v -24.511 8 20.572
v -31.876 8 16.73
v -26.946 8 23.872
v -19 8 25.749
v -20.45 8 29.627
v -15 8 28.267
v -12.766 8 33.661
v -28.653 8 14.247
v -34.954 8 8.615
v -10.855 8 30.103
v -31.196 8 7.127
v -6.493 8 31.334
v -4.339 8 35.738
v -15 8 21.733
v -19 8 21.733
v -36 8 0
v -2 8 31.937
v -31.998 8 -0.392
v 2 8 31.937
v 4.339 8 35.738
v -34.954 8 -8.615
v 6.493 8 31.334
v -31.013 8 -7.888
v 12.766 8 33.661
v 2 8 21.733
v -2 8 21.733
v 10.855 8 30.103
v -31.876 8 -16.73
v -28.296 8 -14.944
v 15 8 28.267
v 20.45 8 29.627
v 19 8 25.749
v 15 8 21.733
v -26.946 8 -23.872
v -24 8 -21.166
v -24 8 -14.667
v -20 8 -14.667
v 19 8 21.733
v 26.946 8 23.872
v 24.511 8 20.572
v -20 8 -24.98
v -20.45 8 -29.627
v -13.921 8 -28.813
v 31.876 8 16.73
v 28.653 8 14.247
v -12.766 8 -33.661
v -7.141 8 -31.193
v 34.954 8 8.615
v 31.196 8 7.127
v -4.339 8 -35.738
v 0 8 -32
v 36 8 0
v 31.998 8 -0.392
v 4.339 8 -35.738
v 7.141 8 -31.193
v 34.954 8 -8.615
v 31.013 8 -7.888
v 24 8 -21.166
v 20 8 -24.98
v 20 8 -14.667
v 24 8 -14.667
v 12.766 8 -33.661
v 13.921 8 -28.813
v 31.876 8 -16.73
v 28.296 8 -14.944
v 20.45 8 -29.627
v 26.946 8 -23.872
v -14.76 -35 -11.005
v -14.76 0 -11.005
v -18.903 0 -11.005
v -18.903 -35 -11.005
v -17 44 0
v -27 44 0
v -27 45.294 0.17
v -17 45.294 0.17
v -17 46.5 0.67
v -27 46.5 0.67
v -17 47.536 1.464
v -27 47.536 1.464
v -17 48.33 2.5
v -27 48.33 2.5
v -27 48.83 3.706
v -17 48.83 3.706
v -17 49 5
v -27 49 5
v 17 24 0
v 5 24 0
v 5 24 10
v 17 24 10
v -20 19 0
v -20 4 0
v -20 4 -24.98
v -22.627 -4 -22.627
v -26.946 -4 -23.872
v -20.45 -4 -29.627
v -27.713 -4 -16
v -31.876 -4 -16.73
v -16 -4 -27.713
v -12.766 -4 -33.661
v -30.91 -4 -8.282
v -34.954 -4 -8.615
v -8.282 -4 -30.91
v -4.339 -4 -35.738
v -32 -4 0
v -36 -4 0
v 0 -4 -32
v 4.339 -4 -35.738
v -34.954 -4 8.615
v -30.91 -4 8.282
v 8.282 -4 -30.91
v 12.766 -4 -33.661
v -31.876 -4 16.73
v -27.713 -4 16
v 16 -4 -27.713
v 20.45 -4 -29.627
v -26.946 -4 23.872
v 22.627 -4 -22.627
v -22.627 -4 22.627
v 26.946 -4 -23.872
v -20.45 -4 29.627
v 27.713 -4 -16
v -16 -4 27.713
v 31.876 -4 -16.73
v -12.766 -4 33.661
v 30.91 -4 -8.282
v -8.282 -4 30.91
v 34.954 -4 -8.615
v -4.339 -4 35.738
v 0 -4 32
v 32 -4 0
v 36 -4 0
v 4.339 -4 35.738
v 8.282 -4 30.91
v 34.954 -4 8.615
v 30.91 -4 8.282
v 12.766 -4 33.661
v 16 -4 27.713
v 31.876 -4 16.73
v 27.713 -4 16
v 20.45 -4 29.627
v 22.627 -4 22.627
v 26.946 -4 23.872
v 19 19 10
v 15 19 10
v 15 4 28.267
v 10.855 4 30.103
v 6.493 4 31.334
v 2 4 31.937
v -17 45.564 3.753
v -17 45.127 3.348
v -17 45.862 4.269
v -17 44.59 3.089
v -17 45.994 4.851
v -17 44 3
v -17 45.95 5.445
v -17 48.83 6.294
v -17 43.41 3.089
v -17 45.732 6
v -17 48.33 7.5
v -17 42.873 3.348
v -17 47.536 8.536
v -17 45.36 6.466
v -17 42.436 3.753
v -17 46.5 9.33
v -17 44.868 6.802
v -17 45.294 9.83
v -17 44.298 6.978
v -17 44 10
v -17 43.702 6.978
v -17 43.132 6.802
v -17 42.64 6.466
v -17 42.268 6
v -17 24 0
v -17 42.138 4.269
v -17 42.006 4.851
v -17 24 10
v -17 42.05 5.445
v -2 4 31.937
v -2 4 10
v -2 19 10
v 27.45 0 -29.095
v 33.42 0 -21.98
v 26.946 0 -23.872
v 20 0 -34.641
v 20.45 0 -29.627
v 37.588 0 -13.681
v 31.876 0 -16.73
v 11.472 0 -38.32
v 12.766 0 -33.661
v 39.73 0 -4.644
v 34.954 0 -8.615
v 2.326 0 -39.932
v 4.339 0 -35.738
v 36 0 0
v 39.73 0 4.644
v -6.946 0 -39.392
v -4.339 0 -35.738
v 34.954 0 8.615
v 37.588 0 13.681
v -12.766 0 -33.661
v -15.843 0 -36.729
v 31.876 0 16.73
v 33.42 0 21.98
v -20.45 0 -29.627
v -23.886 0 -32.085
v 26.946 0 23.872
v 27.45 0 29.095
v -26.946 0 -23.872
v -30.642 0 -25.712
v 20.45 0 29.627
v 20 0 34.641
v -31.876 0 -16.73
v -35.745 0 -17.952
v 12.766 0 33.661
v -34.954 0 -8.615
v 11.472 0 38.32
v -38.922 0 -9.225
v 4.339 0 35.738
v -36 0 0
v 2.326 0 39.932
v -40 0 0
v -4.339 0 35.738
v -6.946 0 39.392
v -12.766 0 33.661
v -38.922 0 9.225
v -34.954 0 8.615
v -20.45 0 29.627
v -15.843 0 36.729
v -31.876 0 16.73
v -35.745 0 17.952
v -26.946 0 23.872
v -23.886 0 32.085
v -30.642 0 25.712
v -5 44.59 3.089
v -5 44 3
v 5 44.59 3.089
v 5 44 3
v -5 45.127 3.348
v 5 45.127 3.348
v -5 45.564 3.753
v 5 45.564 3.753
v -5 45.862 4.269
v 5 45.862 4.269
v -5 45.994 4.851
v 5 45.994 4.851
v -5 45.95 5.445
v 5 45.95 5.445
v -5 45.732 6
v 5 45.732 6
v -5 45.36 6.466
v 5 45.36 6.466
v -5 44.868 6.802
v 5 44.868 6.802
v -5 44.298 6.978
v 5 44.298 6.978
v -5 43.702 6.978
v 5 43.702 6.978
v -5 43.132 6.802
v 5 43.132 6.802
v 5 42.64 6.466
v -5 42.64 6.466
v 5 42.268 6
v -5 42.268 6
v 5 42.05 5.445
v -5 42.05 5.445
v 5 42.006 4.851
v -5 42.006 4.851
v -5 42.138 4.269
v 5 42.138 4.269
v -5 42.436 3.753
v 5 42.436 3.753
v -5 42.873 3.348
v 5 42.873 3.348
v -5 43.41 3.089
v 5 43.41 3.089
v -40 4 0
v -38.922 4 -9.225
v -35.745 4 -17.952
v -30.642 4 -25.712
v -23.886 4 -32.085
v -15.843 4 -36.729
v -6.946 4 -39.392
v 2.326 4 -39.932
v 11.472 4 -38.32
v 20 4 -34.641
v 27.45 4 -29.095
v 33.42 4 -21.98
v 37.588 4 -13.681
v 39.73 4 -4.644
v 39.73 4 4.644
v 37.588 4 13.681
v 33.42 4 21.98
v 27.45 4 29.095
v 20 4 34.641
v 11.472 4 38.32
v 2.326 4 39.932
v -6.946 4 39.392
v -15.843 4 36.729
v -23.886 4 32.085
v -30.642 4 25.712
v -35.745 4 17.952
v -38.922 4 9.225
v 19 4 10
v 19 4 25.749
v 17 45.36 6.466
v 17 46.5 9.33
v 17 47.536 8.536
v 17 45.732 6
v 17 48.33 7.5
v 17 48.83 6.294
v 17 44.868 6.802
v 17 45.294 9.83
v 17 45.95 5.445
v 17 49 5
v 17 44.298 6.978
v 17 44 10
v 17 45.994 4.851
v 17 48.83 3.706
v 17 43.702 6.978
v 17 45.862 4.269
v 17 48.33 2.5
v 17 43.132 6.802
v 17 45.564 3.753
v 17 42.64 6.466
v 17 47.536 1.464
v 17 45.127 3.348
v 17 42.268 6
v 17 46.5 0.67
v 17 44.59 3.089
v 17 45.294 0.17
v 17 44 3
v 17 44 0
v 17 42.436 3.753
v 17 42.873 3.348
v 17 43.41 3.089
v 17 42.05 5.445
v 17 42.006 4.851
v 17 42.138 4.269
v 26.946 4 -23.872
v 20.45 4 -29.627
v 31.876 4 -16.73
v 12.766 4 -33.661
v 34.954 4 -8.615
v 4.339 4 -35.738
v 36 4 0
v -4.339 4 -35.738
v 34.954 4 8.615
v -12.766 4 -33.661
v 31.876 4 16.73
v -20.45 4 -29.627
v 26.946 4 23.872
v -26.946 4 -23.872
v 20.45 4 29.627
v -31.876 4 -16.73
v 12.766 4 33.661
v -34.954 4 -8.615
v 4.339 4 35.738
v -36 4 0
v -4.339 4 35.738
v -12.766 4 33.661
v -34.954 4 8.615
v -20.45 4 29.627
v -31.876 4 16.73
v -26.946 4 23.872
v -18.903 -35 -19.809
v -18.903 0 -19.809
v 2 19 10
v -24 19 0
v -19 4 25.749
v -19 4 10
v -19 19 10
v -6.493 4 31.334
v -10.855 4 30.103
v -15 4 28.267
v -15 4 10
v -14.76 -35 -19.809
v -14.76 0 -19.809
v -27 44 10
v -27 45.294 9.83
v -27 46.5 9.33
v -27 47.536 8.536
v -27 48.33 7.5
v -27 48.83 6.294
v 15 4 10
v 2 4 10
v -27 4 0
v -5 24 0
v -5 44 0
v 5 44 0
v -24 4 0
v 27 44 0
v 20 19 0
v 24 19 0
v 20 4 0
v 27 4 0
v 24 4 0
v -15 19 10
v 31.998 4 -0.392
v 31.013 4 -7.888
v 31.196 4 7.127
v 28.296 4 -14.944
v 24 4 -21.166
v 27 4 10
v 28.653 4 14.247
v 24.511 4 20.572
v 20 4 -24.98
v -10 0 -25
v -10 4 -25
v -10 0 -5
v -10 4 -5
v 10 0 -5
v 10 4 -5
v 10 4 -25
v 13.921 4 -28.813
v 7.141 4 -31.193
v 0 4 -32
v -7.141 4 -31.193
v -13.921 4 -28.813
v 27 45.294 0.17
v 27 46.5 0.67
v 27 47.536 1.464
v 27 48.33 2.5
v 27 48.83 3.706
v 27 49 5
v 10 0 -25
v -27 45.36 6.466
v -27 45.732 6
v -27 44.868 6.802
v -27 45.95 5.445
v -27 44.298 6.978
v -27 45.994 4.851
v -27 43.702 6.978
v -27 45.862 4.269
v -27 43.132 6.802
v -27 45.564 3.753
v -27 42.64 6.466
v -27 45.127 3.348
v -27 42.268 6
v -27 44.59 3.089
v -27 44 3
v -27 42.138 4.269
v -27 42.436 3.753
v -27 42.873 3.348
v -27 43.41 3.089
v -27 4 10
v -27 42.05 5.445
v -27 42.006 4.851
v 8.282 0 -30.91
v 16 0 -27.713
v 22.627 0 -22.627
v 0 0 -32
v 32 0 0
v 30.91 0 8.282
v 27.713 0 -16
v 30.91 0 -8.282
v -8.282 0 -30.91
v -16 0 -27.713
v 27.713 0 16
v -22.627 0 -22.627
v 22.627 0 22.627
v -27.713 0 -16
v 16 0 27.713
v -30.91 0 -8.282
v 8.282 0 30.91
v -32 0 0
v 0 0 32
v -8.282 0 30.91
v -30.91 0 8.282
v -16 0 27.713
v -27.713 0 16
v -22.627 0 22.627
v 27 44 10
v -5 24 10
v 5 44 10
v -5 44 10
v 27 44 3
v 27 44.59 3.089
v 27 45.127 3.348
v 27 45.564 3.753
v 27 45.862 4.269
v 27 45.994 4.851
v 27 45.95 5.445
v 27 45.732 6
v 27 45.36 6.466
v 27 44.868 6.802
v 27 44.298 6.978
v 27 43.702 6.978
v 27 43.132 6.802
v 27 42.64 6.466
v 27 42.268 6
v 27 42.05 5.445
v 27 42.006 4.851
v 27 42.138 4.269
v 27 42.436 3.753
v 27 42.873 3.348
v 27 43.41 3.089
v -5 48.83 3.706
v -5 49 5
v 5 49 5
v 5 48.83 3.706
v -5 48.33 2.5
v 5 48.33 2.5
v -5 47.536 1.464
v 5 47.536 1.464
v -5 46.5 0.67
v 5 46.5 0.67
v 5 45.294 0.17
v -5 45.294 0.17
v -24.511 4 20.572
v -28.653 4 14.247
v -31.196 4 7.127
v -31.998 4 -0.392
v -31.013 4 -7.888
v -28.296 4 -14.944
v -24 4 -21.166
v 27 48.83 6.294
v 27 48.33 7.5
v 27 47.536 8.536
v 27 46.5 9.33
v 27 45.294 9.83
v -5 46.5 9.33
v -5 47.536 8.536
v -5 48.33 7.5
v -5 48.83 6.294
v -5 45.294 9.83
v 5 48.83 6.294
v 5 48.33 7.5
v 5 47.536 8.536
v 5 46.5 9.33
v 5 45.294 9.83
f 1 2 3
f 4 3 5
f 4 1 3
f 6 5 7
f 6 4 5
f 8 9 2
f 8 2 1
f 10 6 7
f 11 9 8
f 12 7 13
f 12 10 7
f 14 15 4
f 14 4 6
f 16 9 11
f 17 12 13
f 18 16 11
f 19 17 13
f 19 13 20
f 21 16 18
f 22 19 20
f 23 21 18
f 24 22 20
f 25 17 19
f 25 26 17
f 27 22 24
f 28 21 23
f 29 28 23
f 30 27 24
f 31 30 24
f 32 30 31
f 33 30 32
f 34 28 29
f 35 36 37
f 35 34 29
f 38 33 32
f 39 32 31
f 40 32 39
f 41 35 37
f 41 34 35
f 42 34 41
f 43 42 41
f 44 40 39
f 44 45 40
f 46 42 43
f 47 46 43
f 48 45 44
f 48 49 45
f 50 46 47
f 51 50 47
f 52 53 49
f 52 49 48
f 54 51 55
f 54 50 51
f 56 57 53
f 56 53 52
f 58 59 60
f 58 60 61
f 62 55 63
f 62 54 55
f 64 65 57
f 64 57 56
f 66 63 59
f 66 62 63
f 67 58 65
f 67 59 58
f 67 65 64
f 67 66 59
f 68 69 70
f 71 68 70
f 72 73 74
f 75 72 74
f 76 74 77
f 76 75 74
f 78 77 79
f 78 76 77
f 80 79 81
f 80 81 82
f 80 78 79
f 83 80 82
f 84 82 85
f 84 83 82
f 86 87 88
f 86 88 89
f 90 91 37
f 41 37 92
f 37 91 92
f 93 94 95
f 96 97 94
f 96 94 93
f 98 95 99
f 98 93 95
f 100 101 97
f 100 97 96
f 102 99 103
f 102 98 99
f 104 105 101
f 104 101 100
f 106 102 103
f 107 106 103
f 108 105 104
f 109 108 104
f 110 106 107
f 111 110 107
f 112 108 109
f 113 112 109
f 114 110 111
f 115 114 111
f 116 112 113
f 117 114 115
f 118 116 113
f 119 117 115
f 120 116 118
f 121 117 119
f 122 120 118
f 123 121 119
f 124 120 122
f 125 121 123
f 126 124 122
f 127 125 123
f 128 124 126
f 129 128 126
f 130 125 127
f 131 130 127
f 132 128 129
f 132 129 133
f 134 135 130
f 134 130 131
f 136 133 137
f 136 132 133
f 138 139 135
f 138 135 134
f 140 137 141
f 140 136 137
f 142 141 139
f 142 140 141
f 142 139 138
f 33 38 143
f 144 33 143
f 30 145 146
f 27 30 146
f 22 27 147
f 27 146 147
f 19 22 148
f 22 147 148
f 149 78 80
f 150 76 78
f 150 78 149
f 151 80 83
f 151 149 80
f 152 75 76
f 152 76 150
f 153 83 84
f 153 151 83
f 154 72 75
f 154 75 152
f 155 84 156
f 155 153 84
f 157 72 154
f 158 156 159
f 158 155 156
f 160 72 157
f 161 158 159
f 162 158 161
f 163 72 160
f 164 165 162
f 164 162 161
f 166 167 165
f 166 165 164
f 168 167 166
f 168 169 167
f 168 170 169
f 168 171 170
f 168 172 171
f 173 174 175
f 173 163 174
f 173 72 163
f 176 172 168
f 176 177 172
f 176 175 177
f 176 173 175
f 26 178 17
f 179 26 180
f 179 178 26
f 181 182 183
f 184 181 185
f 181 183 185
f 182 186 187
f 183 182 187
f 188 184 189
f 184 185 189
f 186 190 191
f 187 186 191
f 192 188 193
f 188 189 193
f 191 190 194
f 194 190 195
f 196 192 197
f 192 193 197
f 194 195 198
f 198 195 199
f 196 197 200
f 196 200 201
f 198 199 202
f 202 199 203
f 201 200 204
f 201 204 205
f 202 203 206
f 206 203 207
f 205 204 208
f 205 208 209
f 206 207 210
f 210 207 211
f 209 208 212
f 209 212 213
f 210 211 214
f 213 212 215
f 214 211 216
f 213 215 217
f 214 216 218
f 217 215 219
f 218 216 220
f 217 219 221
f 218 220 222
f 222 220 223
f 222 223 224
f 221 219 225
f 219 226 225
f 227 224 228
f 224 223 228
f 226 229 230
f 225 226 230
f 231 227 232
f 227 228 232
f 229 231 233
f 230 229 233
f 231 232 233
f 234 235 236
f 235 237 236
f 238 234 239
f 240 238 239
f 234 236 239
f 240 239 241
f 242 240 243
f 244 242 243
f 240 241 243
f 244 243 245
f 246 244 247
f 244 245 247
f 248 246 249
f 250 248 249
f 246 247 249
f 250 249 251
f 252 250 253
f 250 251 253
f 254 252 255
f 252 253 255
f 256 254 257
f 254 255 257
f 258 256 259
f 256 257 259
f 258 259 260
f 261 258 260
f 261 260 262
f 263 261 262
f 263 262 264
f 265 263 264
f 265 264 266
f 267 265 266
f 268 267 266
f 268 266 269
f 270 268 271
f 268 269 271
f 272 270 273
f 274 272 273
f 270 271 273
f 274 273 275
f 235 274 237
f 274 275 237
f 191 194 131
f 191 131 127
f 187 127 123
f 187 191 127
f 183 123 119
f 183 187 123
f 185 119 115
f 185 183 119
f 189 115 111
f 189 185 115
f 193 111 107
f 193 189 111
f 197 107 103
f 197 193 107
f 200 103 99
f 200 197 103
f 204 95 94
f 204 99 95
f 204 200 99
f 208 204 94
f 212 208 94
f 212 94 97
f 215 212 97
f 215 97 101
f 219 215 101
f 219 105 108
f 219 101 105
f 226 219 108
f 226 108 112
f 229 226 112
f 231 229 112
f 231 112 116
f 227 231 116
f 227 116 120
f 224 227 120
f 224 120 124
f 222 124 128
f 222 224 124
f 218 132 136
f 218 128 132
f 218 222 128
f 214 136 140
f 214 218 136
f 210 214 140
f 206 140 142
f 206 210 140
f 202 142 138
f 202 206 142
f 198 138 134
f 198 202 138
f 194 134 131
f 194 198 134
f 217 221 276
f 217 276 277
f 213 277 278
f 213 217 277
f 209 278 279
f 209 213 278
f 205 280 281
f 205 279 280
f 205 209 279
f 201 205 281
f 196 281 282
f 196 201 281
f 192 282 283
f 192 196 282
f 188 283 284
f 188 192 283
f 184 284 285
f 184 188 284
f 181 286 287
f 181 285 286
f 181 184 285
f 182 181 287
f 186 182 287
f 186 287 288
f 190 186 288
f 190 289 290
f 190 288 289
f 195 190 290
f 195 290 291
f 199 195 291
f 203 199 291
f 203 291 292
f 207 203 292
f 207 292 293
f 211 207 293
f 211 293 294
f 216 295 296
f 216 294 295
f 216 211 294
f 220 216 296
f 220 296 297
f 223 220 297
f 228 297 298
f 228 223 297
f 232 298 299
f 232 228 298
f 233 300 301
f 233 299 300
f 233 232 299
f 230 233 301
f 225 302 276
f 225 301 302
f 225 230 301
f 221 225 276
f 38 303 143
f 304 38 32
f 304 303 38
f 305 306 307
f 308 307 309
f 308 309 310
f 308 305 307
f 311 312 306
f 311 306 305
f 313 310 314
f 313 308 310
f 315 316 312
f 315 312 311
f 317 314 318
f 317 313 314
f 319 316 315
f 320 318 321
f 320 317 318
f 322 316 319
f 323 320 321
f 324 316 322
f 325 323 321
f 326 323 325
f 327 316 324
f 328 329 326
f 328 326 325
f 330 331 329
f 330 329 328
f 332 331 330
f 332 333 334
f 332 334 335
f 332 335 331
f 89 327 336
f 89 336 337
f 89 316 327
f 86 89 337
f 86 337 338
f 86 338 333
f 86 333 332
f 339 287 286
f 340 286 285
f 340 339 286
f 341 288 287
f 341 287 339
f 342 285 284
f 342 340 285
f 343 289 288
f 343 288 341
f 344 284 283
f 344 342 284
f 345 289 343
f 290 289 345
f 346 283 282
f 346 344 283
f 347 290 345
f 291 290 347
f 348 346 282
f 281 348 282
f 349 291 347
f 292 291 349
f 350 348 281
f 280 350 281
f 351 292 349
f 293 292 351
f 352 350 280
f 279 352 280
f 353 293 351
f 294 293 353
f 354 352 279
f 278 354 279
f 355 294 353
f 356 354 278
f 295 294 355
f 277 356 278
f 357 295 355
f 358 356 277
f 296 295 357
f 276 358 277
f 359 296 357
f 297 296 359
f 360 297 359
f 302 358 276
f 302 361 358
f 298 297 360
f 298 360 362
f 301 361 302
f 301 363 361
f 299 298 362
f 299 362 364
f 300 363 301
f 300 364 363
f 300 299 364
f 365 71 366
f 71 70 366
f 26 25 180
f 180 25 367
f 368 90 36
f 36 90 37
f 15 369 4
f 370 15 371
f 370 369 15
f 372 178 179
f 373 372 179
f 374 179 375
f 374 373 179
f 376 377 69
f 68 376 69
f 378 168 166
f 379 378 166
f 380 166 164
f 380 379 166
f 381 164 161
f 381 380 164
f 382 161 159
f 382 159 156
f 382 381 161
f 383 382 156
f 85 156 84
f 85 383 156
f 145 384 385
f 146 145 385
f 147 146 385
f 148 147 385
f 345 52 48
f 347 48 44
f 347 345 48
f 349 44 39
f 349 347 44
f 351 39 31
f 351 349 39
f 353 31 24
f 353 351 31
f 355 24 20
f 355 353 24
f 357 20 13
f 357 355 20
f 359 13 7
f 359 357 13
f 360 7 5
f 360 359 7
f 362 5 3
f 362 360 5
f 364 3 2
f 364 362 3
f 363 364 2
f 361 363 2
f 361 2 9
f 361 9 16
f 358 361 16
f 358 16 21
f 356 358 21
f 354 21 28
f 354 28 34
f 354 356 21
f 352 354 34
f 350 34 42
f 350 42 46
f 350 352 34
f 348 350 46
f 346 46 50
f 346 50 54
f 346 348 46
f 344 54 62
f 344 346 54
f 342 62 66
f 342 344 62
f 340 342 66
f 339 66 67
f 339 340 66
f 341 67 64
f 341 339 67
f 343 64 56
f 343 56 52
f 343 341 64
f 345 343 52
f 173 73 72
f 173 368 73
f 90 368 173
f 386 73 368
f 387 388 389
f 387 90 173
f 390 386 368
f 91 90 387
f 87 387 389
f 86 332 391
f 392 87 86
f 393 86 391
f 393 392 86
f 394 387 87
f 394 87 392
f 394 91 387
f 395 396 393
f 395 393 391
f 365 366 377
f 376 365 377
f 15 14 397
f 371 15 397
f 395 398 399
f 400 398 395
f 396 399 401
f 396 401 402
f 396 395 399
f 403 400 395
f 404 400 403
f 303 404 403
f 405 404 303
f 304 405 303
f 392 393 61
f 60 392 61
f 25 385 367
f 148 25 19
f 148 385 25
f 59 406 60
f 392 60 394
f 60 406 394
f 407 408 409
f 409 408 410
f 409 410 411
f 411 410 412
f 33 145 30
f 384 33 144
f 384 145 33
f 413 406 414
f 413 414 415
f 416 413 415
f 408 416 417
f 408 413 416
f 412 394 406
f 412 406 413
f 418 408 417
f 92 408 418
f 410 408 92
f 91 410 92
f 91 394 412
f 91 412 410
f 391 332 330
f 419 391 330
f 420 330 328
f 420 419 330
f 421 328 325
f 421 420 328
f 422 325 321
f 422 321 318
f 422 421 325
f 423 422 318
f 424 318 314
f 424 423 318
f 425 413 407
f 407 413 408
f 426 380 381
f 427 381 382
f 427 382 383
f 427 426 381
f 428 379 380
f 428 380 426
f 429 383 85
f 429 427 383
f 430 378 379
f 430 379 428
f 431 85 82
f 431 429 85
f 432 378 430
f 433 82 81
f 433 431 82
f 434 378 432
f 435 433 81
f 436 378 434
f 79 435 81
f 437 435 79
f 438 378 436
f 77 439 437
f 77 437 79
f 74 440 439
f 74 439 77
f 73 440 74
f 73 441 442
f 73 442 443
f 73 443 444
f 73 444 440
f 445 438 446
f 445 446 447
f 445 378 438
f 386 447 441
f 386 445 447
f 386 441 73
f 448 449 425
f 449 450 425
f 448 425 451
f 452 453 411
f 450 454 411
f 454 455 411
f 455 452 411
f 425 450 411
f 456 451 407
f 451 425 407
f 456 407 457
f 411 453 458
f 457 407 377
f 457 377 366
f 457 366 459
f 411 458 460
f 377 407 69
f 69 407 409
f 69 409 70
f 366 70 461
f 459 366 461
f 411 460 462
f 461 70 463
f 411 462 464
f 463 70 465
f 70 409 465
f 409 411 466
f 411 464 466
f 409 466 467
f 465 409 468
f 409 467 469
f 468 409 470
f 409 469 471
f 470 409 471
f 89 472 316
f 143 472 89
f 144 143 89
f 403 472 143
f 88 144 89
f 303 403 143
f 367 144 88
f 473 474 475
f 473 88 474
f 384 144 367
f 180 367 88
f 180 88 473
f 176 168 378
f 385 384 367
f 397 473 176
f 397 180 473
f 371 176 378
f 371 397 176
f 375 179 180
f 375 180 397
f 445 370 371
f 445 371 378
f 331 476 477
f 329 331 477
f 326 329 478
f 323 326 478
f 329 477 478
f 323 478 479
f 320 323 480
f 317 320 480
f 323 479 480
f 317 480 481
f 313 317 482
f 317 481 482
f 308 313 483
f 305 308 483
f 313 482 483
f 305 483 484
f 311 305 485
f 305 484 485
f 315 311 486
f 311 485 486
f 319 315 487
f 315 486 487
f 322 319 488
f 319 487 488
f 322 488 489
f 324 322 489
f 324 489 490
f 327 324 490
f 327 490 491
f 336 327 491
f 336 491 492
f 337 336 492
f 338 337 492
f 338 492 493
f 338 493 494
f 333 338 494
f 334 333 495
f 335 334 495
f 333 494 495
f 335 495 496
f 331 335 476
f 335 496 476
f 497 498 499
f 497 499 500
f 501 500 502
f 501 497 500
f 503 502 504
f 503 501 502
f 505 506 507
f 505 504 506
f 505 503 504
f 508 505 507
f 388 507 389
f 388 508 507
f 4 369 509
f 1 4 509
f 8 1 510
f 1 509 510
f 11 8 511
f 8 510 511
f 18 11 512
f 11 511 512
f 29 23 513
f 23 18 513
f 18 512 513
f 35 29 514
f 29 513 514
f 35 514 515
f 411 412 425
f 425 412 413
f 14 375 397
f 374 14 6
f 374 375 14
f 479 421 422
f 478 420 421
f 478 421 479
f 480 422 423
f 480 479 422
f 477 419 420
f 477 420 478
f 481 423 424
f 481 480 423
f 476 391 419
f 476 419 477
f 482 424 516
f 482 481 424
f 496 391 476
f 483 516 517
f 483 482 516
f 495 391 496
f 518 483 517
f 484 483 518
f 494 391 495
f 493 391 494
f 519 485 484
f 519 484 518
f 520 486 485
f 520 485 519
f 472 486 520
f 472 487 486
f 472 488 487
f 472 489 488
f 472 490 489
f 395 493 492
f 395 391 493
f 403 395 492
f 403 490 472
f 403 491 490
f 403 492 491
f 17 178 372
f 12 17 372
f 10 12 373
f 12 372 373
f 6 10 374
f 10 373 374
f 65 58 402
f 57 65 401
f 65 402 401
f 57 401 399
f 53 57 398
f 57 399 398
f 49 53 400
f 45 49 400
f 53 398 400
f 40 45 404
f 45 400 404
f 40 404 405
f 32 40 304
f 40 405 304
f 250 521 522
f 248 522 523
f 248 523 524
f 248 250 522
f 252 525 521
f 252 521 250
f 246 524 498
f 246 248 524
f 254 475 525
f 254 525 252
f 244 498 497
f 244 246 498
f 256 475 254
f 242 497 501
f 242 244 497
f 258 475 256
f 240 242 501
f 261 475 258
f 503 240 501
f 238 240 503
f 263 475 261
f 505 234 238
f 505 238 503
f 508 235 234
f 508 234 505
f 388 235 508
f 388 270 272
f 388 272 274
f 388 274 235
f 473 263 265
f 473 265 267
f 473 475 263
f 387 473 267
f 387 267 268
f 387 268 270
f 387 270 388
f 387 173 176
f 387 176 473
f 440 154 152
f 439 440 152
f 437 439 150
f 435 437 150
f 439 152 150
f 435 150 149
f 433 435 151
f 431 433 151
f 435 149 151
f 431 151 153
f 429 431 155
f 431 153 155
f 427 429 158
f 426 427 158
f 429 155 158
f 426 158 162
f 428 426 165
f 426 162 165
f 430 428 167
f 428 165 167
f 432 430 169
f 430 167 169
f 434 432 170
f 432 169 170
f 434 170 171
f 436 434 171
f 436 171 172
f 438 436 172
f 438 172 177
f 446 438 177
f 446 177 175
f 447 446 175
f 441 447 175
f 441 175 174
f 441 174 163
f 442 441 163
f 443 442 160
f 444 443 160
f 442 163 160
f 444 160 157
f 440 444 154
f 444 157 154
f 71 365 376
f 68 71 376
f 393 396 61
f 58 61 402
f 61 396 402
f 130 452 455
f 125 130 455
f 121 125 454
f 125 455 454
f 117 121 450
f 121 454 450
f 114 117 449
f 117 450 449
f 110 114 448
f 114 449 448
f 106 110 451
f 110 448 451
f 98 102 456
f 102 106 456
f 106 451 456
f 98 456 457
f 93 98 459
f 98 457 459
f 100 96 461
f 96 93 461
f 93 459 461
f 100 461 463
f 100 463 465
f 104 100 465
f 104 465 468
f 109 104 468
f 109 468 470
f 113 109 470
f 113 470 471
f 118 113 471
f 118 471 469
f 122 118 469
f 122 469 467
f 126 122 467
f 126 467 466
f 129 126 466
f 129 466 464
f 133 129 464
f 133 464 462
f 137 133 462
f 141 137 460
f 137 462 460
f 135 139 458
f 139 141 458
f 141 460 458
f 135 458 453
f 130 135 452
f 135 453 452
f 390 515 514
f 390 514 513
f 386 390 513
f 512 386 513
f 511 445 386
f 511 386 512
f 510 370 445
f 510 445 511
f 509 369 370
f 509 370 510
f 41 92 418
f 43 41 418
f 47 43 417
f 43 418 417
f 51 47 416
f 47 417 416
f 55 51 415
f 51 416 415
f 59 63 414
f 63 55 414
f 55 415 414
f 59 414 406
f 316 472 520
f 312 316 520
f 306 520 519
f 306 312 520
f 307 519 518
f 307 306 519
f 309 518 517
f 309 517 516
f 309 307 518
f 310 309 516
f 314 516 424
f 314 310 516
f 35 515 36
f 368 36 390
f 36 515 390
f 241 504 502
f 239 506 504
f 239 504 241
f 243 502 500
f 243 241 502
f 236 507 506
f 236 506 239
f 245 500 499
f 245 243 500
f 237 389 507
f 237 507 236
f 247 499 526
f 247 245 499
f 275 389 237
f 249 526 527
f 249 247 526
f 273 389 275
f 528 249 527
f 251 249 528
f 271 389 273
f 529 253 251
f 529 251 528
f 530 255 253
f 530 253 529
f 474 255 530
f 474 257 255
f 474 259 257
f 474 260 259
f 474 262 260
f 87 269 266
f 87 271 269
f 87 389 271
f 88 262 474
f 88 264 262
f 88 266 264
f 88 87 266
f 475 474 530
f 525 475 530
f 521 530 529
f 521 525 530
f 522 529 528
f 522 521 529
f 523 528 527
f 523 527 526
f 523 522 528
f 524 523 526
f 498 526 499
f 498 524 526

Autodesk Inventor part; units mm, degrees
ref_plane "YZ Plane" through (0, 0, 0) normal (1, 0, 0) x (0, 1, 0)
ref_plane "XZ Plane" through (0, 0, 0) normal (0, 1, 0) x (-1, 0, 0)
ref_plane "XY Plane" through (0, 0, 0) normal (0, 0, 1) x (1, 0, 0)
sketch "Эскиз1" plane through (0, 0, 0) normal (0, 1, 0) x (-1, 0, 0)
  circle A0 centre (0, 0) radius 40
  dimension "d0" = 80
extrude "Выдавливание1" add sketch "Эскиз1" along normal blind 4
sketch "Эскиз2" plane through (0, 4, 0) normal (0, 1, 0) x (1, 0, 0)
  line L0 (-17, -10) -> (-27, -10)
  line L1 (-27, -10) -> (-27, 0)
  line L2 (-27, 0) -> (-17, 0)
  line L3 (-17, 0) -> (-17, -10)
  line L4 (27, -10) -> (17, -10)
  line L5 (17, -10) -> (17, 0)
  line L6 (17, 0) -> (27, 0)
  line L7 (27, 0) -> (27, -10)
  line L8 (5, -10) -> (-5, -10)
  line L9 (-5, -10) -> (-5, 0)
  line L10 (-5, 0) -> (5, 0)
  line L11 (5, 0) -> (5, -10)
  circle A0 centre (0, 0) radius 40 projected
  line L12 (0, 40) -> (0, 16.8758)
  line L13 (40, 0) -> (27.344, 0)
  line L14 (0, 0) -> (0, 40)
  line L15 (40, 0) -> (0, 0)
  line L16 (39.6863, -5) -> (-39.6863, -5)
  dimension "d3" = 10
  dimension "d4" = 12
  dimension "d5" = 10
  dimension "d14" = 5
extrude "Выдавливание2" add sketch "Эскиз2" along normal blind 45 contours L0 L1 L16 L3 | L16 L1 L2 L3 | L16 L11 L8 L9 | L9 L10 L11 L16 | L16 L7 L4 L5 | L5 L6 L7 L16
sketch "Эскиз3" plane through (27, 4, 10) normal (1, 0, 0) x (0, 0, -1)
  line L0 (0, 45) -> (10, 45) projected
  line L1 (10, 0) -> (10, 45) projected
  circle A0 centre (5, 40) radius 2
  point P0 (10, -4)
  point P1 (5, 45)
  point P2 (10, 40)
  dimension "d8" = 5
  dimension "d9" = 4
  dimension "d20" = 0
extrude "Выдавливание3" cut sketch "Эскиз3" against normal blind 100
fillet "Сопряжение1" radius 5 6 edges at (-22, 49, 10) (-22, 49, 0) (0, 49, 10) (0, 49, 0) (22, 49, 10) (22, 49, 0)
sketch "Эскиз4" plane through (0, 4, 0) normal (0, 1, 0) x (1, 0, 0)
  line L0 (10, 25) -> (-10, 25)
  line L1 (-10, 25) -> (-10, 5)
  line L2 (-10, 5) -> (10, 5)
  line L3 (10, 5) -> (10, 25)
  circle A0 centre (0, 0) radius 40 projected
  line L4 (0, 40) -> (0, 0)
  dimension "d15" = 20
  dimension "d16" = 20
  dimension "d17" = 5
extrude "Выдавливание4" cut sketch "Эскиз4" against normal blind 10 contours L3 L2 L4 L0 | L4 L2 L1 L0
sketch "Эскиз5" plane through (0, 4, 0) normal (0, 1, 0) x (1, 0, 0)
  line L0 (-27, -10) -> (-27, 0) projected
  line L1 (17, 0) -> (27, 0) projected
  line L2 (-27, -10) -> (27, -10)
  line L3 (27, -10) -> (27, 0)
  line L4 (27, 0) -> (-27, 0)
  line L5 (-27, 0) -> (-27, -10)
  point P0 (0, 0)
extrude "Выдавливание5" add sketch "Эскиз5" along normal blind 20
sketch "Эскиз6" plane through (0, 4, 0) normal (0, 1, 0) x (1, 0, 0)
  line L0 (-27, 0) -> (27, 0) projected
  line L1 (20, 0) -> (24, 0)
  line L2 (24, 0) -> (24, 20)
  line L3 (24, 20) -> (20, 20)
  line L4 (20, 20) -> (20, 0)
  line L5 (-24, 0) -> (-20, 0)
  line L6 (-20, 0) -> (-20, 20)
  line L7 (-20, 20) -> (-24, 20)
  line L8 (-24, 20) -> (-24, 0)
  line L9 (-5, -10) -> (5, -10) projected
  line L10 (-2, -10) -> (2, -10)
  line L11 (2, -10) -> (2, -30)
  line L12 (2, -30) -> (-2, -30)
  line L13 (-2, -30) -> (-2, -10)
  line L14 (-27, -10) -> (-17, -10) projected
  line L15 (-19, -10) -> (-15, -10)
  line L16 (-15, -10) -> (-15, -26)
  line L17 (-15, -26) -> (-19, -26)
  line L18 (-19, -26) -> (-19, -10)
  line L19 (27, -10) -> (-27, -10) projected
  line L20 (15, -10) -> (19, -10)
  line L21 (19, -10) -> (19, -26)
  line L22 (19, -26) -> (15, -26)
  line L23 (15, -26) -> (15, -10)
  line L24 (17, 0) -> (17, -10) projected
  line L25 (0, 0) -> (0, 4.7699)
  line L26 (-17, -10) -> (-17, 0) projected
  line L27 (-22, -10) -> (-22, 0)
  line L28 (17, -10) -> (27, -10) projected
  line L29 (22, -10) -> (22, 0)
  line L30 (-17, 0) -> (-27, 0) projected
  dimension "d23" = 4
  dimension "d24" = 20
  dimension "d25" = 16
  dimension "d26" = 20
  dimension "d27" = 0
extrude "Выдавливание6" add sketch "Эскиз6" along normal blind 15 contours L8 L7 L6 L0 | L14 L15 L16 L17 L18 | L4 L3 L2 L0 | L19 L21 L22 L23 | L9 L11 L12 L13
sketch "Эскиз7" plane through (27, 4, 10) normal (1, 0, 0) x (0, 0, -1)
  line L0 (-16, 0) -> (0, 0) projected
  line L1 (-16, 0) -> (0, 15)
  line L2 (0, 0) -> (0, 30) projected
  line L3 (10, 0) -> (10, 30) projected
  line L4 (30, 0) -> (30, 15) projected
  line L5 (10, 15) -> (30, 0)
  line L6 (50, 0) -> (-30, 0) projected
  line L7 (-30, 0) -> (50, 0)
  line L8 (50, 0) -> (50, -10)
  line L9 (50, -10) -> (-30, -10)
  line L10 (-30, -10) -> (-30, 0)
  arc A0 (10, 40) -> (0, 40) centre (5, 40) ccw projected
  line L11 (10, 0) -> (5, 0)
  line L12 (5, 0) -> (5, 45)
  line L13 (5, 45) -> (10, 45)
  line L14 (10, 45) -> (10, 0)
  line L15 (5, 45) -> (0, 45)
  line L16 (0, 45) -> (0, 0)
  line L17 (0, 0) -> (5, 0)
  line L18 (5, 0) -> (5, 45)
  point P0 (10, -4)
  dimension "d32" = 0
extrude "Выдавливание7" cut sketch "Эскиз7" against normal mid plane 1000 keep common part
sketch "Эскиз8" plane through (0, 4, 0) normal (0, 1, 0) x (1, 0, 0)
  circle A0 centre (0, 0) radius 36
  circle A1 centre (0, 0) radius 40 projected
  circle A2 centre (0, 0) radius 32
  line L0 (-19, -10) -> (-15, -10) projected
  line L1 (-19, -10) -> (-15, -10)
  line L2 (-15, -10) -> (-15, -28.2666)
  line L3 (-15, -28.2666) -> (-19, -28.2666)
  line L4 (-19, -28.2666) -> (-19, -10)
  line L5 (19, -10) -> (19, -26) projected
  line L6 (19, -10) -> (15, -10)
  line L7 (15, -10) -> (15, -28.2666)
  line L8 (15, -28.2666) -> (19, -28.2666)
  line L9 (19, -28.2666) -> (19, -10)
  line L10 (-2, -26) -> (-2, -10) projected
  line L11 (-2, -10) -> (2, -10)
  line L12 (2, -10) -> (2, -36)
  line L13 (2, -36) -> (-2, -36)
  line L14 (-2, -36) -> (-2, -10)
  line L15 (20, 0) -> (20, 20) projected
  line L16 (20, 0) -> (24, 0)
  line L17 (24, 0) -> (24, 26.8328)
  line L18 (24, 26.8328) -> (20, 26.8328)
  line L19 (20, 26.8328) -> (20, 0)
  line L20 (-20, 0) -> (20, 0) projected
  line L21 (-20, 0) -> (-24, 0)
  line L22 (-24, 0) -> (-24, 26.8328)
  line L23 (-24, 26.8328) -> (-20, 26.8328)
  line L24 (-20, 26.8328) -> (-20, 0)
  point P0 (0, -40)
  point P1 (0, -36)
  point P2 (0, -32)
  point P3 (-20, 24.98)
  point P4 (-24, 21.166)
  point P5 (24, 21.166)
  point P6 (20, 24.98)
  point P7 (19, -25.7488)
  point P8 (-2, -31.9374)
  point P9 (2, -31.9374)
  point P10 (-19, -25.7488)
  dimension "d33" = 4
  dimension "d34" = 4
extrude "Выдавливание8" add sketch "Эскиз8" along normal blind 4 contours A0 L12 A2 L8 L9 L5 L17 | L18 L19 A2 L24 L23 A0 | L17 A2 L19 L18 | A0 L14 A2 L12 | L22 A2 L4 L3 L14 A0 | L23 L24 A2 L22 | L17 L16 L15 L19 A2 | A2 L14 L10 L11 L12 | A2 L24 L21 L22 | L7 L6 L5 A2 | A2 L5 L9 L8 | L4 L0 L2 A2 | A2 L3 L4
sketch "Эскиз9" plane through (0, 0, 0) normal (0, -1, 0) x (1, 0, 0)
  circle A0 centre (0, 0) radius 36
  circle A1 centre (0, 0) radius 32
extrude "Выдавливание9" add sketch "Эскиз9" along normal blind 4
sketch "Эскиз10" plane through (0, 0, 0) normal (0, -1, 0) x (1, 0, 0)
  line L0 (-18.9031, -19.8094) -> (-14.76, -19.8094)
  line L1 (-14.76, -19.8094) -> (-14.76, -11.0052)
  line L2 (-14.76, -11.0052) -> (-18.9031, -11.0052)
  line L3 (-18.9031, -11.0052) -> (-18.9031, -19.8094)
  point P0 (0, 0)
extrude "Выдавливание10" add sketch "Эскиз10" along normal blind 35
properties part number "типа подшипник"
